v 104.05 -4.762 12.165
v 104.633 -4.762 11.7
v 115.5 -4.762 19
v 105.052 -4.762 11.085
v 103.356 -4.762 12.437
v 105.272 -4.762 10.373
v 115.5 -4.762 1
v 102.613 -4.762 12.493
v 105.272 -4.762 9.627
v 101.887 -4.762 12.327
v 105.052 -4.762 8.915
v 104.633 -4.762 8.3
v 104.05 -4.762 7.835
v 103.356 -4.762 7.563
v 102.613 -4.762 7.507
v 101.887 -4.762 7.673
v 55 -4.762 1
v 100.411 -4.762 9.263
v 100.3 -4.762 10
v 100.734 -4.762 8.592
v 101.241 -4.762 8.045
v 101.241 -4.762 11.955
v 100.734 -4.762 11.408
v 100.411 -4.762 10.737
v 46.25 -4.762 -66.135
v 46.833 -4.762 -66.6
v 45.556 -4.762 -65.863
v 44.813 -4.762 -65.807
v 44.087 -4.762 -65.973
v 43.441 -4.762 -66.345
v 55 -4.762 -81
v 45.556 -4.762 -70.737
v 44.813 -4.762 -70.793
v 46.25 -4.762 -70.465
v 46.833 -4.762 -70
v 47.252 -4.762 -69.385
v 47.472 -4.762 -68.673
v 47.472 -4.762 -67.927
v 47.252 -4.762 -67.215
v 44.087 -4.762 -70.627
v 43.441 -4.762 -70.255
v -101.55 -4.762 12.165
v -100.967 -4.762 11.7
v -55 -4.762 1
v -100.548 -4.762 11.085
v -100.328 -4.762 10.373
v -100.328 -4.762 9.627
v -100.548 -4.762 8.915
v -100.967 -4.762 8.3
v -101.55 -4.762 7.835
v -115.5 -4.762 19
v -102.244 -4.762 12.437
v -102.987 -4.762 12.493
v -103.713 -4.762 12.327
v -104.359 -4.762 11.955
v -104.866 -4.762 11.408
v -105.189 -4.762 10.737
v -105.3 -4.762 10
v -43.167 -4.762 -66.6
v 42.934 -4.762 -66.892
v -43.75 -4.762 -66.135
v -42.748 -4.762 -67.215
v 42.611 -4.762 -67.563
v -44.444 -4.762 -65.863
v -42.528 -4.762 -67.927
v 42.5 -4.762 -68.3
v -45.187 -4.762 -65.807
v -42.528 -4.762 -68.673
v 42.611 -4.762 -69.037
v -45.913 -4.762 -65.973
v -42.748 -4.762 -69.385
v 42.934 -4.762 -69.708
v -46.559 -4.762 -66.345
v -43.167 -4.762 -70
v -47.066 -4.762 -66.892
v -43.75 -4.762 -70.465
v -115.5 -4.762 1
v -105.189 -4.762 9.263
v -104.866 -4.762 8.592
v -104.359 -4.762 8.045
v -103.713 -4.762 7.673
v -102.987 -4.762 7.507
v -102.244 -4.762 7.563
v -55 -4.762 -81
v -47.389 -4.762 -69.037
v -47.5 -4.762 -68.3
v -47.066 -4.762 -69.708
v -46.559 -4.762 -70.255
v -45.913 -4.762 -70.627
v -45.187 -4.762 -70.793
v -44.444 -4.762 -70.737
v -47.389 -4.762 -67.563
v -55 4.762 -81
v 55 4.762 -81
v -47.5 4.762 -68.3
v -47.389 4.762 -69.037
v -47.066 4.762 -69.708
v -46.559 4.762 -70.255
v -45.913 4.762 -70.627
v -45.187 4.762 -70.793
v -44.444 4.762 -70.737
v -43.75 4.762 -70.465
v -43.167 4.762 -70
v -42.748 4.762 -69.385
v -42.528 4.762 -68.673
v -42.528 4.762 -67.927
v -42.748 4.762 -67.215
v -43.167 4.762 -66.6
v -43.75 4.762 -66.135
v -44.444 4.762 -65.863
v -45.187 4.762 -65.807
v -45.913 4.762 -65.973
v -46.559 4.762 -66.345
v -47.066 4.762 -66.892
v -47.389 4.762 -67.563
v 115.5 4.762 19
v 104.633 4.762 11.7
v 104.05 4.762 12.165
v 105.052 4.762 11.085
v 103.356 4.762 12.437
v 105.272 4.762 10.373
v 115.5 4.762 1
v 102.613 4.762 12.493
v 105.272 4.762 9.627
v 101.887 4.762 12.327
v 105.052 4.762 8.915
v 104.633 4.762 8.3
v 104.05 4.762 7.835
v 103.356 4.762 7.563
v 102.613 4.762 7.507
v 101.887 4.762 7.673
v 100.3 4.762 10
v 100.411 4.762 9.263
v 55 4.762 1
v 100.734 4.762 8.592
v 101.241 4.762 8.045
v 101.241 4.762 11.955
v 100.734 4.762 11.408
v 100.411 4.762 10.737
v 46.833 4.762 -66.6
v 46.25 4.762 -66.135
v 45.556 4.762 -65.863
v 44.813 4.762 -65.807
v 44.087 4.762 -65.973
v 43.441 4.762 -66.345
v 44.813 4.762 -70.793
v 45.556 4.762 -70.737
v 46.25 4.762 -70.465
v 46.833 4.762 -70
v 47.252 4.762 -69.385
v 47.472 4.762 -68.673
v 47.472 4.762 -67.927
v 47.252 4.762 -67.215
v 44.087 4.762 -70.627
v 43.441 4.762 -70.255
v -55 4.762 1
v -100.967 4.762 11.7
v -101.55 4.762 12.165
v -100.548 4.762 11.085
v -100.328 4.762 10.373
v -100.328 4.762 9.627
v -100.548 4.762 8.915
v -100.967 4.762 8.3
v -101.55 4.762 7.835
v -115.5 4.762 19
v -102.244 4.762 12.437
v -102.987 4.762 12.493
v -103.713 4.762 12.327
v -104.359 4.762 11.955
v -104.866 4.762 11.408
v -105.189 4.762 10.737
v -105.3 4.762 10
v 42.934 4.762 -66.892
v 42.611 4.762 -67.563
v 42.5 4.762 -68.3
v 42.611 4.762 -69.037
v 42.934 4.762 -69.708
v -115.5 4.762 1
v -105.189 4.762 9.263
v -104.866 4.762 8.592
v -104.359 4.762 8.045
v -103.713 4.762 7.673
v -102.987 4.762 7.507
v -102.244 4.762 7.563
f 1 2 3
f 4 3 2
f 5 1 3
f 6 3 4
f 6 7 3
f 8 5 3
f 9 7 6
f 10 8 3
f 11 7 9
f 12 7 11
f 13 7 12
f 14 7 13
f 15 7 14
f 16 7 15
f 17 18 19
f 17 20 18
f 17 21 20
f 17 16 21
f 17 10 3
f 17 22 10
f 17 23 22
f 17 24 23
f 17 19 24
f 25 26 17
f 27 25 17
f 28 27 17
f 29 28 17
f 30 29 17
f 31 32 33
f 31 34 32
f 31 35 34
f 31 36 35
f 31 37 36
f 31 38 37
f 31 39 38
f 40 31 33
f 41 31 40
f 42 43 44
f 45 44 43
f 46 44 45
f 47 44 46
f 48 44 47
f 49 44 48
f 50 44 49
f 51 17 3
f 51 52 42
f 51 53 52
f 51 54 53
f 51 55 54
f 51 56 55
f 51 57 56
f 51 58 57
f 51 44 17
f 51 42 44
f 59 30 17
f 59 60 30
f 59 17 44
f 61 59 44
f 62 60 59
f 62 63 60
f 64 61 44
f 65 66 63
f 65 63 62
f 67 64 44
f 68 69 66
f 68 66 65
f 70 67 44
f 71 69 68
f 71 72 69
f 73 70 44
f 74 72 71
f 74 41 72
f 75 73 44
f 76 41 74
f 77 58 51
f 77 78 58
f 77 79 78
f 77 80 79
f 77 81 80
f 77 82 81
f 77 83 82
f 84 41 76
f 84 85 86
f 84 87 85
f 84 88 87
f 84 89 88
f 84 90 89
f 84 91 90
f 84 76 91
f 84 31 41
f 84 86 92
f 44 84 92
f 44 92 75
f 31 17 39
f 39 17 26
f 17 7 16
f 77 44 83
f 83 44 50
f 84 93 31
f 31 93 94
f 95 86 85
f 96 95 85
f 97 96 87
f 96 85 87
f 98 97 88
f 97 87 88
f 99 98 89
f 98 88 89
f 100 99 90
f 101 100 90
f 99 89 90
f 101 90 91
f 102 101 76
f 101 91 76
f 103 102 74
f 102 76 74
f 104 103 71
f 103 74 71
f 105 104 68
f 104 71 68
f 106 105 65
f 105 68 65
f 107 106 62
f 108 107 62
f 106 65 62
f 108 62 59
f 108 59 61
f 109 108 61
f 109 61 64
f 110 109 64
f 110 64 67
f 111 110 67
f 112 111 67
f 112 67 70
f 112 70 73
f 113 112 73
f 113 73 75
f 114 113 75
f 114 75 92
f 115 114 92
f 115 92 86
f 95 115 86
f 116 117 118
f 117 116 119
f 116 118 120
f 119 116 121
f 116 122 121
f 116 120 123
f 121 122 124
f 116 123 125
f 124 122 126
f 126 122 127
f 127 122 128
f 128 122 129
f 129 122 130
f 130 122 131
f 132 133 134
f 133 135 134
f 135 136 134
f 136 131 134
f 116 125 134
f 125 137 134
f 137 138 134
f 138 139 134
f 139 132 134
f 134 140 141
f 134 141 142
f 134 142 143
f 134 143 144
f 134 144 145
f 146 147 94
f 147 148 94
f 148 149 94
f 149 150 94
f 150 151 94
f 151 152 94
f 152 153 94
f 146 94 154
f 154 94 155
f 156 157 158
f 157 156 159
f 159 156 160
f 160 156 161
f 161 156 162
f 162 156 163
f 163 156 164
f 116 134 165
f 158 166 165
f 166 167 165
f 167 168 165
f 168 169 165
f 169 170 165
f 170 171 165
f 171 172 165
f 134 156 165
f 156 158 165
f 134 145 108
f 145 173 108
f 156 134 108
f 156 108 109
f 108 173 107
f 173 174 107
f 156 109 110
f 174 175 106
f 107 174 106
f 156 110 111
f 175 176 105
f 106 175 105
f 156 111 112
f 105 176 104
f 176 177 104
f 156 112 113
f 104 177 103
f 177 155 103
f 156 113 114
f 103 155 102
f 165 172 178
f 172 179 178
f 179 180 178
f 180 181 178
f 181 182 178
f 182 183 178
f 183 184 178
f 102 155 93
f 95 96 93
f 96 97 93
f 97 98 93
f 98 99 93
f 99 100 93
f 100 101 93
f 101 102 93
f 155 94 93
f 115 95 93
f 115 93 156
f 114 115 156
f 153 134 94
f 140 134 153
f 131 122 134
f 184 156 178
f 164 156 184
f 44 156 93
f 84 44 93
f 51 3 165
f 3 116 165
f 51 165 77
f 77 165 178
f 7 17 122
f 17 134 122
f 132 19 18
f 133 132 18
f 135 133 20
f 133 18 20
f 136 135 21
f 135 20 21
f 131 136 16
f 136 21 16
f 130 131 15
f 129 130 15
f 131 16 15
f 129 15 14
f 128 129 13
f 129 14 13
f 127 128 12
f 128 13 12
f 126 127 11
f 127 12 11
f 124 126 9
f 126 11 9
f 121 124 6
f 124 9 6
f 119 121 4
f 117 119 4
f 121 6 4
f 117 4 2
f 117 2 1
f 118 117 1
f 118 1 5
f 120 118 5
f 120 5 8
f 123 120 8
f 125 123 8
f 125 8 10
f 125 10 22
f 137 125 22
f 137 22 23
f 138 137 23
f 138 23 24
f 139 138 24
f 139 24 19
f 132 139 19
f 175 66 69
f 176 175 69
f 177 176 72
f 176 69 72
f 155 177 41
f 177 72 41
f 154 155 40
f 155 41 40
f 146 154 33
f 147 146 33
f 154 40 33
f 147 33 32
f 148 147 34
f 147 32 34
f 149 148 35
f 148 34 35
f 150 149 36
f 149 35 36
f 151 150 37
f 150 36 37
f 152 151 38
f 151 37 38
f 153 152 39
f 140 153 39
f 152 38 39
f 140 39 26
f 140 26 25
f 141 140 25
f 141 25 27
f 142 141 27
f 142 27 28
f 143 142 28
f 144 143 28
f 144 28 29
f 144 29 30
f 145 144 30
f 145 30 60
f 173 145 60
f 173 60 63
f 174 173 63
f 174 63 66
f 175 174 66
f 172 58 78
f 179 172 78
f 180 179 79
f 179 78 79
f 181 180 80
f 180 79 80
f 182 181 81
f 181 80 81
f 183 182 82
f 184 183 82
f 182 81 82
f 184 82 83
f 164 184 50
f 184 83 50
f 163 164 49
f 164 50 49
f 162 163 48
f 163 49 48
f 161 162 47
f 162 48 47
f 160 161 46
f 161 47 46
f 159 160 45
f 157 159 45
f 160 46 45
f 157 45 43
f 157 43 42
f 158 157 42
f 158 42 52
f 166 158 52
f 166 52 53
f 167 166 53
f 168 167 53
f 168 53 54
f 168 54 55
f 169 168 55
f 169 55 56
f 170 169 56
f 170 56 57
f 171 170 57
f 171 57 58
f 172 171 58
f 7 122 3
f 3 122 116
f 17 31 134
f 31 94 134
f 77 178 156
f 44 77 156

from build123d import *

# Parameters (mm, degrees)
BOSS_EXTRUDE1_DEPTH             = 4.7625
TAP_DRILL_FOR_M6X1_0_TAP1_D     = 5
TAP_DRILL_FOR_M6X1_0_TAP1_DEPTH = 9.525


with BuildPart() as part:
    # Sketch1 → Boss-Extrude1 (new body, symmetric)
    with BuildSketch(Plane(origin=(0, 0, 0), x_dir=(1, 0, 0), z_dir=(0, 1, 0))):
        Polygon((-55, -1), (-55, 81), (55, 81), (55, -1), (115.5, -1), (115.5, -19), (-115.5, -19), (-115.5, -1), align=None)
    extrude(amount=BOSS_EXTRUDE1_DEPTH, both=True)

    # Tap Drill for M6x1.0 Tap1
    with Locations(Plane(origin=(0, 4.7625, 0), x_dir=(1, 0, 0), z_dir=(0, 1, 0))):
        with Locations((-45, 68.3), (45, 68.3), (-102.8, -10), (102.8, -10)):
            Hole(TAP_DRILL_FOR_M6X1_0_TAP1_D / 2, depth=TAP_DRILL_FOR_M6X1_0_TAP1_DEPTH)


solid = part.part
